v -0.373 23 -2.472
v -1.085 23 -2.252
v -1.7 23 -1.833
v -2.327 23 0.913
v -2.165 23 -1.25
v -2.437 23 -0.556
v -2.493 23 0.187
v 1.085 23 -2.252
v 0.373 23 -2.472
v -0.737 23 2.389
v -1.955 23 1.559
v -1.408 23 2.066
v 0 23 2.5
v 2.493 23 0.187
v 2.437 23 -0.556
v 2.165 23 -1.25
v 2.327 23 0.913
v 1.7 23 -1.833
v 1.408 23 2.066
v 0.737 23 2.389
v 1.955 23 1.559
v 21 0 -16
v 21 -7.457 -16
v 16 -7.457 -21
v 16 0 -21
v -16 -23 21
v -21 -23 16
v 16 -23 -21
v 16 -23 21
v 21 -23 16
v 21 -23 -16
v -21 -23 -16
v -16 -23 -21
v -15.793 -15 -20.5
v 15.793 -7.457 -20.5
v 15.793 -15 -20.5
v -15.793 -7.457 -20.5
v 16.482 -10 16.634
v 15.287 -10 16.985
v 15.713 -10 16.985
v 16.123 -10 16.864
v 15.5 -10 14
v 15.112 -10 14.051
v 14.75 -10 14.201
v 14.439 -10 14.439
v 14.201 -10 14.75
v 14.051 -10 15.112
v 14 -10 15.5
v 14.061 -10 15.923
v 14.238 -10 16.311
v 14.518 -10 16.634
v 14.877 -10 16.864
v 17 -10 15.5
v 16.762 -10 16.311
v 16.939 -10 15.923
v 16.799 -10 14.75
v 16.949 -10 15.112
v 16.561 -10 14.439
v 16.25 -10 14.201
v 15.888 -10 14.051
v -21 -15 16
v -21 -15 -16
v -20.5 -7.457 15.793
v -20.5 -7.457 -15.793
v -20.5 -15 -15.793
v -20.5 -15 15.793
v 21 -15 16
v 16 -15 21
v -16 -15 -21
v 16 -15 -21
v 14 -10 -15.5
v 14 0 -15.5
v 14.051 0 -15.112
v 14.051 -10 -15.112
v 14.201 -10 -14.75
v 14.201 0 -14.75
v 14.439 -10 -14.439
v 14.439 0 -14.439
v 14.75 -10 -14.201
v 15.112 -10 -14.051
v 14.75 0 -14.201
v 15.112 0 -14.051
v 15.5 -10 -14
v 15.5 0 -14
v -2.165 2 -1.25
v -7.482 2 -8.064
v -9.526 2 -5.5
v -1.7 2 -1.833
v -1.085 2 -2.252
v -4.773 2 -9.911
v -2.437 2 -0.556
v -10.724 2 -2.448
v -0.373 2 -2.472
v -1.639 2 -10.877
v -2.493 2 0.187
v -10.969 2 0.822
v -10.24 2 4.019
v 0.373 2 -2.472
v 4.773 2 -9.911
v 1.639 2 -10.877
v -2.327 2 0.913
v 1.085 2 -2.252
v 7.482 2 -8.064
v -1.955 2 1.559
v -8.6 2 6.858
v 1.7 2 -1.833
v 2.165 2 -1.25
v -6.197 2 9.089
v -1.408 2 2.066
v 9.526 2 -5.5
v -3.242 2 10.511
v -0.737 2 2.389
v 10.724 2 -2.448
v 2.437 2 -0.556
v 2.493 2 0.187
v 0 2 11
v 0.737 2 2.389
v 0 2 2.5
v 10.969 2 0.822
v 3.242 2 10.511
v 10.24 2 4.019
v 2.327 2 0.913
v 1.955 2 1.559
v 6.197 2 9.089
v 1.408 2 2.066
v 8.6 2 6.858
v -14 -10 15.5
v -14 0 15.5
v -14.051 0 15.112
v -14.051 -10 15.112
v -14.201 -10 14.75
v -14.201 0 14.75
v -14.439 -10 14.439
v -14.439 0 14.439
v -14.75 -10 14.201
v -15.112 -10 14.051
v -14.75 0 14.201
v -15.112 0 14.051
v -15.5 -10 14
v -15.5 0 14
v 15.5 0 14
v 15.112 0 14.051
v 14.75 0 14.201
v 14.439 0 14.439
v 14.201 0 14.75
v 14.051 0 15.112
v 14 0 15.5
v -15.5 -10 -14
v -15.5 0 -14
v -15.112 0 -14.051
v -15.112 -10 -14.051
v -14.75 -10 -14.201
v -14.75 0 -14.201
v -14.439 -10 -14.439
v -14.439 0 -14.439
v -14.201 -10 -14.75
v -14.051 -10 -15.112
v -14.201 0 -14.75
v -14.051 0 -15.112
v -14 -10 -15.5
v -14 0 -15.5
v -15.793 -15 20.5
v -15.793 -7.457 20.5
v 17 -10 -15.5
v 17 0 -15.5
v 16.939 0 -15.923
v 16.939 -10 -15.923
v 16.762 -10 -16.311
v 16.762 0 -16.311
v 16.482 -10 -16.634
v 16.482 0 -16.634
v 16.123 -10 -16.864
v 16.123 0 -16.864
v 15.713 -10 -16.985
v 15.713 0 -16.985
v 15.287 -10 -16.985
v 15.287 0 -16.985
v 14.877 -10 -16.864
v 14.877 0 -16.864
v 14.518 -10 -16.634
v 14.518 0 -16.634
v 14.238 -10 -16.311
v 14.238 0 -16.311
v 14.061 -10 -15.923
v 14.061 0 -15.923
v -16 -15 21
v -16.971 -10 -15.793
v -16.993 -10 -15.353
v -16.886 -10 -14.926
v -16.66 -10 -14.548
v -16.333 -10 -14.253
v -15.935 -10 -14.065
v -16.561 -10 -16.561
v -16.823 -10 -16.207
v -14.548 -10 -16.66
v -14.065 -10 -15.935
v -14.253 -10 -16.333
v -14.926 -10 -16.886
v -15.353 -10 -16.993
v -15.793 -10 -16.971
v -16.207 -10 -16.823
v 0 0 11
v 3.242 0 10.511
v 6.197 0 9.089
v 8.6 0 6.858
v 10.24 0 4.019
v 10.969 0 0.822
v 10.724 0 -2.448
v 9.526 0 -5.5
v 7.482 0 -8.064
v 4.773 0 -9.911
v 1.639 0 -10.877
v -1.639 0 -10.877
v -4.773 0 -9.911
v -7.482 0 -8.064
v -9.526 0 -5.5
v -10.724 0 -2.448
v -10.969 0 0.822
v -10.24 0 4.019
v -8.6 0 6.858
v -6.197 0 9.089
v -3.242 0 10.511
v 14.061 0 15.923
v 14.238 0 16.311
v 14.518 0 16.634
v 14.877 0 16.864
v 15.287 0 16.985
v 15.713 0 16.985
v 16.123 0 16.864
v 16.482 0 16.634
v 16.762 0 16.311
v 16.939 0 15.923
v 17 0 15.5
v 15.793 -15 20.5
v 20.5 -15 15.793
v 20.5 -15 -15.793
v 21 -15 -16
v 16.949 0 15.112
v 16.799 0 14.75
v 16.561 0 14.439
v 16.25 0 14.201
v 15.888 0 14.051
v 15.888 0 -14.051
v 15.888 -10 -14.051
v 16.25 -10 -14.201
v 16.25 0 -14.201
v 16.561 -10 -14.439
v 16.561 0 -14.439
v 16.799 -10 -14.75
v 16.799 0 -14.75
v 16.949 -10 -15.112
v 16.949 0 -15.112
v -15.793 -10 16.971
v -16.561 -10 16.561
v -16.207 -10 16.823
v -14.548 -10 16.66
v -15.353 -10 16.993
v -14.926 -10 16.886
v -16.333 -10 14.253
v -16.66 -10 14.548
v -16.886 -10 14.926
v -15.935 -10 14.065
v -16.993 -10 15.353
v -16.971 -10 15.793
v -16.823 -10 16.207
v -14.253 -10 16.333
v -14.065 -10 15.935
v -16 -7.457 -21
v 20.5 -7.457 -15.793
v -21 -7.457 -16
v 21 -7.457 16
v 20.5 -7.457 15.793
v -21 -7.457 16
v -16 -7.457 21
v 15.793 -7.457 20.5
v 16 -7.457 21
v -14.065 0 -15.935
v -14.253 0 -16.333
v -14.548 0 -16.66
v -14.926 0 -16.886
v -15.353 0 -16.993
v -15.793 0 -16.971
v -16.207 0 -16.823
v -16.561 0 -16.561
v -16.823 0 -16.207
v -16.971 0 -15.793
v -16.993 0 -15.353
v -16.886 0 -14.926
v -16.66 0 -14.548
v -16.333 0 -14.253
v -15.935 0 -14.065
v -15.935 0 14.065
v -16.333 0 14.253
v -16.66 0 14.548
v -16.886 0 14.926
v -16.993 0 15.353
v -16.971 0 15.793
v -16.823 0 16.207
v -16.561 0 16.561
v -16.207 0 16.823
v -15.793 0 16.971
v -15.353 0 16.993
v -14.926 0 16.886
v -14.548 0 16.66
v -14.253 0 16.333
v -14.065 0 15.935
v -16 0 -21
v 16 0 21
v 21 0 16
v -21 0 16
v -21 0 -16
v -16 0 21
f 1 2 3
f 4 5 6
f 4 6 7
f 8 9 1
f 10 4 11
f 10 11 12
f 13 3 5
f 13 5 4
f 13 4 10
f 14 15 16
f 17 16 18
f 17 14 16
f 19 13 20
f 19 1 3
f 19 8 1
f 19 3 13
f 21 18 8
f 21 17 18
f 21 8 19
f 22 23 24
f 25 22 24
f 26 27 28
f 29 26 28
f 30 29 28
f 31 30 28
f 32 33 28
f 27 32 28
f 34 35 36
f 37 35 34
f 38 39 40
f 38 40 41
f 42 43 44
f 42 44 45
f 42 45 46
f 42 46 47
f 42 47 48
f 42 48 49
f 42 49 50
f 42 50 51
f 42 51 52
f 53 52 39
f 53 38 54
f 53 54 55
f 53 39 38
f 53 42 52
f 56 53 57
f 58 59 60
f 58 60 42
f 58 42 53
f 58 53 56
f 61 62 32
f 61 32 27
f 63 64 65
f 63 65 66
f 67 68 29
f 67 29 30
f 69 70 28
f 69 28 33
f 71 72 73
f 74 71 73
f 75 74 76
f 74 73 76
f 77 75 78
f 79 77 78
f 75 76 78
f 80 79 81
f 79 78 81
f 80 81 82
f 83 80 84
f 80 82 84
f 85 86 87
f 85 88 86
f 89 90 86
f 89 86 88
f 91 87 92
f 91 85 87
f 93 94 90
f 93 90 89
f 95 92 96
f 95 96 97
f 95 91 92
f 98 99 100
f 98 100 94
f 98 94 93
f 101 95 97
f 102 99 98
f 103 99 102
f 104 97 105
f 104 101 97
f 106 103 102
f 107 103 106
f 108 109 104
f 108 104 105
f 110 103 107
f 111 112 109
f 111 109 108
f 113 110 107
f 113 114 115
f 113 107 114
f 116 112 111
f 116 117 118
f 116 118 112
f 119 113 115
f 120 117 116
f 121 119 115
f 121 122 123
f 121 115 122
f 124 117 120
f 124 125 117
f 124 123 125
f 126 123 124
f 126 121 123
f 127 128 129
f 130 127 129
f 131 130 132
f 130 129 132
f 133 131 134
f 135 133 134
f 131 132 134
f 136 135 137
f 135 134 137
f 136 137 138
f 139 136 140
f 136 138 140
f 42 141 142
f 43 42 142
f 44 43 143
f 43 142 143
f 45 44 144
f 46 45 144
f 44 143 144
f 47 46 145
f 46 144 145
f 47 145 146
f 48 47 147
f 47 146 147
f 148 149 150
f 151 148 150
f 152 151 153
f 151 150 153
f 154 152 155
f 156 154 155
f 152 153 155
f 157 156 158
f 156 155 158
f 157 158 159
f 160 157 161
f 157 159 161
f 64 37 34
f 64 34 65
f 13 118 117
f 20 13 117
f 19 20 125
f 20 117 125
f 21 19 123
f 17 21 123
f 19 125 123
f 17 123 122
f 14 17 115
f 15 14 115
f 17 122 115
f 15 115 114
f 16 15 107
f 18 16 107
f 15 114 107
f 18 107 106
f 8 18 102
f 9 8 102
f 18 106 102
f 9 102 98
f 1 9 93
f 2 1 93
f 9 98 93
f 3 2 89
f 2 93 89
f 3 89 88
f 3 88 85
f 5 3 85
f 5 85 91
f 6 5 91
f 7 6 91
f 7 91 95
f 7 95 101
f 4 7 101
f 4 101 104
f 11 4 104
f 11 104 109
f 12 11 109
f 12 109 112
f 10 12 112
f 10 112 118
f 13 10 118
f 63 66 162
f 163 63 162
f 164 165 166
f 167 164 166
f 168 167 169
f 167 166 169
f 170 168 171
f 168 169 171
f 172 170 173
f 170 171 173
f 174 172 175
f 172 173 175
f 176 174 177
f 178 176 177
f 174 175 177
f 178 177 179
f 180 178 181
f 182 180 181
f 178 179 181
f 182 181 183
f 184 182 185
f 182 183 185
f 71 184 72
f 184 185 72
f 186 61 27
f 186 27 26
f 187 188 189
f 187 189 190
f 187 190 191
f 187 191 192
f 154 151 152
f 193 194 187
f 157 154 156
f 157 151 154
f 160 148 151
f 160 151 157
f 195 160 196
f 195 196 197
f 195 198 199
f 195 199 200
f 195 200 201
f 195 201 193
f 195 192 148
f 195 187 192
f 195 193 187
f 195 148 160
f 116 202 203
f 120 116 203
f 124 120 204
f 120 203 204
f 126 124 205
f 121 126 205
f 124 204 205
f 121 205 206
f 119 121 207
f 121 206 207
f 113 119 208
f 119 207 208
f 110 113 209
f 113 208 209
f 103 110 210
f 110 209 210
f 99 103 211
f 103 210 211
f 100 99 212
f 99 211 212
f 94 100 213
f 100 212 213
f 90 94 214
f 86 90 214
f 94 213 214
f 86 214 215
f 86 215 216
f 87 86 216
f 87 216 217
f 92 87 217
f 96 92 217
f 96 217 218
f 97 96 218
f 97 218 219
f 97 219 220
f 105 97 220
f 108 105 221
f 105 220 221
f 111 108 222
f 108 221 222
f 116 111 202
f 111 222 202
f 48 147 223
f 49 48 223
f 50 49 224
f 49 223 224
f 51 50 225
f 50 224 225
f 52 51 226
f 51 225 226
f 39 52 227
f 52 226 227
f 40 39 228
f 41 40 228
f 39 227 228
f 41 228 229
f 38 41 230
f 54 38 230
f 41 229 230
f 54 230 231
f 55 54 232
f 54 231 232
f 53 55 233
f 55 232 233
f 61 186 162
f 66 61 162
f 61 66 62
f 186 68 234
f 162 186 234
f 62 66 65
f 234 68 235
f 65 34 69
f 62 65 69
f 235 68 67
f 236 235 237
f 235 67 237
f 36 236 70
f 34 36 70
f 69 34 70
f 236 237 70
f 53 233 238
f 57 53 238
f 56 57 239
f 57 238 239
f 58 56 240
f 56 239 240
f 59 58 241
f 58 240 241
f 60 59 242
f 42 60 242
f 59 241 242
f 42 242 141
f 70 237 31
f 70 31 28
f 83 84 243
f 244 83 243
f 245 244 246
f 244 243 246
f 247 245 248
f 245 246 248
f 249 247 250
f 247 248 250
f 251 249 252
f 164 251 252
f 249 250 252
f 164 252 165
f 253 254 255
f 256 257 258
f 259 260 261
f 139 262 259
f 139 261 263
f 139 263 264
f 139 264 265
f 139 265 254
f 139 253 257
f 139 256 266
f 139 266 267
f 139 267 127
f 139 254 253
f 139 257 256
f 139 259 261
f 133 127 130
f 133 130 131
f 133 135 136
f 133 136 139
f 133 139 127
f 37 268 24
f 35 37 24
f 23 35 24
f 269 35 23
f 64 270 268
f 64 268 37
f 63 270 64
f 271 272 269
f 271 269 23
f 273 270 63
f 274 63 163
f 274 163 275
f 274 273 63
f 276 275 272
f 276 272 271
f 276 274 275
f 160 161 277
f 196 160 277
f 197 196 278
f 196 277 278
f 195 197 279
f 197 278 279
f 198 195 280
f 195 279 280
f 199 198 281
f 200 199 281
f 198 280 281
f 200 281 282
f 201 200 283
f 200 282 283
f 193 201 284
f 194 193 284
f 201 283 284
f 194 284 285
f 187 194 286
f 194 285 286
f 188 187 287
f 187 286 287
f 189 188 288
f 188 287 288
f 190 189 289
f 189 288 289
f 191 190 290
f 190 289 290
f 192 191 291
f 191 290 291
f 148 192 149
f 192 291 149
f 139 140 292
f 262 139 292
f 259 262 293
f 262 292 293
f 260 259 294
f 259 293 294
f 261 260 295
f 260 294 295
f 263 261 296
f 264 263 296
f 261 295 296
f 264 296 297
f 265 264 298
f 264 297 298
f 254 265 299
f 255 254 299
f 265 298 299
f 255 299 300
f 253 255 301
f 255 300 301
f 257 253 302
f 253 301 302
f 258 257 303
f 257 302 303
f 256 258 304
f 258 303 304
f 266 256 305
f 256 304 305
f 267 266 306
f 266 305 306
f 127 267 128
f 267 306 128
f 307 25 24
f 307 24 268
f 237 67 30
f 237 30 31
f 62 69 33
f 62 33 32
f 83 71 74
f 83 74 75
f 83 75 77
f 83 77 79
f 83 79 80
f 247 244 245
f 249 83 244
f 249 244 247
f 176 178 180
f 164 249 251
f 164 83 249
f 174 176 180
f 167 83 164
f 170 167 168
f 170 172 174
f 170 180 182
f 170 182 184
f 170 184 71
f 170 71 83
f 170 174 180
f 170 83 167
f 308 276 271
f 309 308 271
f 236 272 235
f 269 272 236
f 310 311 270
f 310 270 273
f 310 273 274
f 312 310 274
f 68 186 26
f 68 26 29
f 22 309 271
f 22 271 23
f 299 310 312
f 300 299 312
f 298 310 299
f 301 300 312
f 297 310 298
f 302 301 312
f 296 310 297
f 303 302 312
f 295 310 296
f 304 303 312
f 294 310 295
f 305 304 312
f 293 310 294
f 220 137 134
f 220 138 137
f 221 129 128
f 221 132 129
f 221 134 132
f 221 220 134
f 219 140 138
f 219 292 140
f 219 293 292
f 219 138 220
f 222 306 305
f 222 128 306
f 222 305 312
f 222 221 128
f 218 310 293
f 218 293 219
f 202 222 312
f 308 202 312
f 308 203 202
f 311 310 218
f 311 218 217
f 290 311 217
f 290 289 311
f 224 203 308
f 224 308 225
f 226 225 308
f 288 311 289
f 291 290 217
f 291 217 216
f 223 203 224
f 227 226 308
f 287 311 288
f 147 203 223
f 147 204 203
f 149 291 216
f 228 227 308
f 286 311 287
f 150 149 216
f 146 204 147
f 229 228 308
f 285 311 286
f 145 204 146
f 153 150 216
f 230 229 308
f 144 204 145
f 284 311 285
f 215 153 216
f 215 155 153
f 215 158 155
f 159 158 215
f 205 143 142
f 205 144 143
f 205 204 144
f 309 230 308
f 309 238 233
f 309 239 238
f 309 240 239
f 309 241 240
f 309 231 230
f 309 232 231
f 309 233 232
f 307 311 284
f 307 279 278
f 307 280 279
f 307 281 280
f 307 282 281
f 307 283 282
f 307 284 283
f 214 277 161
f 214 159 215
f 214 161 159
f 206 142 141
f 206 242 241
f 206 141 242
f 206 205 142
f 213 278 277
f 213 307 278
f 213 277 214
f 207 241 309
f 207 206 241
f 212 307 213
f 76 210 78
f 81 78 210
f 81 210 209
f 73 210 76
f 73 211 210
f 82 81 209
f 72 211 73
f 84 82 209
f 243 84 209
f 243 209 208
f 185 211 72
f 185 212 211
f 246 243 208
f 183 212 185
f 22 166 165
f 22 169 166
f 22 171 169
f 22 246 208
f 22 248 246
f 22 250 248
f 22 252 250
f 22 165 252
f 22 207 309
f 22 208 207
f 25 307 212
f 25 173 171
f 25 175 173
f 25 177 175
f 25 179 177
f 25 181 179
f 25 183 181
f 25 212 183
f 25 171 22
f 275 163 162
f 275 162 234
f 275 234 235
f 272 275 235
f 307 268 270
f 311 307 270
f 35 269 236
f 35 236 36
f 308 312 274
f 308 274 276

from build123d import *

# Parameters (mm, degrees)
EXTRUDE_1_DEPTH     = 23
SKETCH_1_3_R        = 2.5
EXTRUDE_2_DEPTH     = 23
SKETCH_1_4_R        = 11
SKETCH_1_4_R_2      = 2.5
EXTRUDE_3_DEPTH     = 2
SKETCH_1_5_R        = 1.5
CUT_EXTRUDE_1_DEPTH = 10
SKETCH_2_W          = 32
SKETCH_2_H          = 7.5432644
CUT_EXTRUDE_2_DEPTH = 0.5
SKETCH_9_W          = 7.071067812
SKETCH_9_H          = 7.5432644
CUT_EXTRUDE_3_DEPTH = 0.5
SKETCH_8_W          = 32
SKETCH_8_H          = 7.5432644
CUT_EXTRUDE_4_DEPTH = 0.5
SKETCH_7_W          = 7.071067812
SKETCH_7_H          = 7.5432644
CUT_EXTRUDE_5_DEPTH = 0.5
SKETCH_6_W          = 32
SKETCH_6_H          = 7.5432644
CUT_EXTRUDE_6_DEPTH = 0.5
SKETCH_5_W          = 7.071067812
SKETCH_5_H          = 7.5432644
CUT_EXTRUDE_7_DEPTH = 0.5
SKETCH_4_W          = 32
SKETCH_4_H          = 7.5432644
CUT_EXTRUDE_8_DEPTH = 0.5
SKETCH_3_W          = 7.071067812
SKETCH_3_H          = 7.5432644
CUT_EXTRUDE_9_DEPTH = 0.5


with BuildPart() as part:
    # Эскиз1 → Бобышка-Вытянуть1 (new body)
    with BuildSketch(Plane(origin=(0, 0, 0), x_dir=(1, 0, 0), z_dir=(0, 1, 0))):
        Polygon((-21, -16), (-16, -21), (16, -21), (21, -16), (21, 16), (16, 21), (-16, 21), (-21, 16), align=None)
    extrude(amount=-EXTRUDE_1_DEPTH)

    # Эскиз1<3> → Бобышка-Вытянуть2 (add)
    with BuildSketch(Plane(origin=(0, 0, 0), x_dir=(1, 0, 0), z_dir=(0, 1, 0))):
        Circle(SKETCH_1_3_R)
    extrude(amount=EXTRUDE_2_DEPTH)

    # Эскиз1<4> → Бобышка-Вытянуть3 (add)
    with BuildSketch(Plane(origin=(0, 0, 0), x_dir=(1, 0, 0), z_dir=(0, 1, 0))):
        Circle(SKETCH_1_4_R)
        Circle(SKETCH_1_4_R_2, mode=Mode.SUBTRACT)
    extrude(amount=EXTRUDE_3_DEPTH)

    # Эскиз1<5> → Вырез-Вытянуть1 (cut)
    with BuildSketch(Plane(origin=(0, 0, 0), x_dir=(1, 0, 0), z_dir=(0, 1, 0))):
        with Locations((-15.5, -15.5)):
            Circle(SKETCH_1_5_R)
        with Locations((15.5, -15.5)):
            Circle(SKETCH_1_5_R)
        with Locations((-15.5, 15.5)):
            Circle(SKETCH_1_5_R)
        with Locations((15.5, 15.5)):
            Circle(SKETCH_1_5_R)
    extrude(amount=-CUT_EXTRUDE_1_DEPTH, mode=Mode.SUBTRACT)

    # Эскиз2 → Вырез-Вытянуть2 (cut)
    with BuildSketch(Plane(origin=(0, 0, -21), x_dir=(-1, 0, 0), z_dir=(0, 0, -1))):
        with Locations((0, -11.2283678)):
            Rectangle(SKETCH_2_W, SKETCH_2_H)
    extrude(amount=-CUT_EXTRUDE_2_DEPTH, mode=Mode.SUBTRACT)

    # Эскиз9 → Вырез-Вытянуть3 (cut)
    with BuildSketch(Plane(origin=(-18.5, 0, -18.5), x_dir=(-0.7071067811865458, 0, 0.7071067811865492), z_dir=(-0.7071067811865492, 0, -0.7071067811865458))):
        with Locations((0, -11.2283678)):
            Rectangle(SKETCH_9_W, SKETCH_9_H)
    extrude(amount=-CUT_EXTRUDE_3_DEPTH, mode=Mode.SUBTRACT)

    # Эскиз8 → Вырез-Вытянуть4 (cut)
    with BuildSketch(Plane.ZY.offset(21)):
        with Locations((0, -11.2283678)):
            Rectangle(SKETCH_8_W, SKETCH_8_H)
    extrude(amount=-CUT_EXTRUDE_4_DEPTH, mode=Mode.SUBTRACT)

    # Эскиз7 → Вырез-Вытянуть5 (cut)
    with BuildSketch(Plane(origin=(-18.5, 0, 18.5), x_dir=(0.7071067811865475, 0, 0.7071067811865477), z_dir=(-0.7071067811865477, 0, 0.7071067811865475))):
        with Locations((0, -11.2283678)):
            Rectangle(SKETCH_7_W, SKETCH_7_H)
    extrude(amount=-CUT_EXTRUDE_5_DEPTH, mode=Mode.SUBTRACT)

    # Эскиз6 → Вырез-Вытянуть6 (cut)
    with BuildSketch(Plane.XY.offset(21)):
        with Locations((0, -11.2283678)):
            Rectangle(SKETCH_6_W, SKETCH_6_H)
    extrude(amount=-CUT_EXTRUDE_6_DEPTH, mode=Mode.SUBTRACT)

    # Эскиз5 → Вырез-Вытянуть7 (cut)
    with BuildSketch(Plane(origin=(18.5, 0, 18.5), x_dir=(0.7071067811865483, 0, -0.7071067811865468), z_dir=(0.7071067811865468, 0, 0.7071067811865483))):
        with Locations((0, -11.2283678)):
            Rectangle(SKETCH_5_W, SKETCH_5_H)
    extrude(amount=-CUT_EXTRUDE_7_DEPTH, mode=Mode.SUBTRACT)

    # Эскиз4 → Вырез-Вытянуть8 (cut)
    with BuildSketch(Plane(origin=(21, 0, 0), x_dir=(0, 0, -1), z_dir=(1, 0, 0))):
        with Locations((0, -11.2283678)):
            Rectangle(SKETCH_4_W, SKETCH_4_H)
    extrude(amount=-CUT_EXTRUDE_8_DEPTH, mode=Mode.SUBTRACT)

    # Эскиз3 → Вырез-Вытянуть9 (cut)
    with BuildSketch(Plane(origin=(18.5, 0, -18.5), x_dir=(-0.7071067811865483, 0, -0.7071067811865468), z_dir=(0.7071067811865468, 0, -0.7071067811865483))):
        with Locations((0, -11.2283678)):
            Rectangle(SKETCH_3_W, SKETCH_3_H)
    extrude(amount=-CUT_EXTRUDE_9_DEPTH, mode=Mode.SUBTRACT)


solid = part.part
